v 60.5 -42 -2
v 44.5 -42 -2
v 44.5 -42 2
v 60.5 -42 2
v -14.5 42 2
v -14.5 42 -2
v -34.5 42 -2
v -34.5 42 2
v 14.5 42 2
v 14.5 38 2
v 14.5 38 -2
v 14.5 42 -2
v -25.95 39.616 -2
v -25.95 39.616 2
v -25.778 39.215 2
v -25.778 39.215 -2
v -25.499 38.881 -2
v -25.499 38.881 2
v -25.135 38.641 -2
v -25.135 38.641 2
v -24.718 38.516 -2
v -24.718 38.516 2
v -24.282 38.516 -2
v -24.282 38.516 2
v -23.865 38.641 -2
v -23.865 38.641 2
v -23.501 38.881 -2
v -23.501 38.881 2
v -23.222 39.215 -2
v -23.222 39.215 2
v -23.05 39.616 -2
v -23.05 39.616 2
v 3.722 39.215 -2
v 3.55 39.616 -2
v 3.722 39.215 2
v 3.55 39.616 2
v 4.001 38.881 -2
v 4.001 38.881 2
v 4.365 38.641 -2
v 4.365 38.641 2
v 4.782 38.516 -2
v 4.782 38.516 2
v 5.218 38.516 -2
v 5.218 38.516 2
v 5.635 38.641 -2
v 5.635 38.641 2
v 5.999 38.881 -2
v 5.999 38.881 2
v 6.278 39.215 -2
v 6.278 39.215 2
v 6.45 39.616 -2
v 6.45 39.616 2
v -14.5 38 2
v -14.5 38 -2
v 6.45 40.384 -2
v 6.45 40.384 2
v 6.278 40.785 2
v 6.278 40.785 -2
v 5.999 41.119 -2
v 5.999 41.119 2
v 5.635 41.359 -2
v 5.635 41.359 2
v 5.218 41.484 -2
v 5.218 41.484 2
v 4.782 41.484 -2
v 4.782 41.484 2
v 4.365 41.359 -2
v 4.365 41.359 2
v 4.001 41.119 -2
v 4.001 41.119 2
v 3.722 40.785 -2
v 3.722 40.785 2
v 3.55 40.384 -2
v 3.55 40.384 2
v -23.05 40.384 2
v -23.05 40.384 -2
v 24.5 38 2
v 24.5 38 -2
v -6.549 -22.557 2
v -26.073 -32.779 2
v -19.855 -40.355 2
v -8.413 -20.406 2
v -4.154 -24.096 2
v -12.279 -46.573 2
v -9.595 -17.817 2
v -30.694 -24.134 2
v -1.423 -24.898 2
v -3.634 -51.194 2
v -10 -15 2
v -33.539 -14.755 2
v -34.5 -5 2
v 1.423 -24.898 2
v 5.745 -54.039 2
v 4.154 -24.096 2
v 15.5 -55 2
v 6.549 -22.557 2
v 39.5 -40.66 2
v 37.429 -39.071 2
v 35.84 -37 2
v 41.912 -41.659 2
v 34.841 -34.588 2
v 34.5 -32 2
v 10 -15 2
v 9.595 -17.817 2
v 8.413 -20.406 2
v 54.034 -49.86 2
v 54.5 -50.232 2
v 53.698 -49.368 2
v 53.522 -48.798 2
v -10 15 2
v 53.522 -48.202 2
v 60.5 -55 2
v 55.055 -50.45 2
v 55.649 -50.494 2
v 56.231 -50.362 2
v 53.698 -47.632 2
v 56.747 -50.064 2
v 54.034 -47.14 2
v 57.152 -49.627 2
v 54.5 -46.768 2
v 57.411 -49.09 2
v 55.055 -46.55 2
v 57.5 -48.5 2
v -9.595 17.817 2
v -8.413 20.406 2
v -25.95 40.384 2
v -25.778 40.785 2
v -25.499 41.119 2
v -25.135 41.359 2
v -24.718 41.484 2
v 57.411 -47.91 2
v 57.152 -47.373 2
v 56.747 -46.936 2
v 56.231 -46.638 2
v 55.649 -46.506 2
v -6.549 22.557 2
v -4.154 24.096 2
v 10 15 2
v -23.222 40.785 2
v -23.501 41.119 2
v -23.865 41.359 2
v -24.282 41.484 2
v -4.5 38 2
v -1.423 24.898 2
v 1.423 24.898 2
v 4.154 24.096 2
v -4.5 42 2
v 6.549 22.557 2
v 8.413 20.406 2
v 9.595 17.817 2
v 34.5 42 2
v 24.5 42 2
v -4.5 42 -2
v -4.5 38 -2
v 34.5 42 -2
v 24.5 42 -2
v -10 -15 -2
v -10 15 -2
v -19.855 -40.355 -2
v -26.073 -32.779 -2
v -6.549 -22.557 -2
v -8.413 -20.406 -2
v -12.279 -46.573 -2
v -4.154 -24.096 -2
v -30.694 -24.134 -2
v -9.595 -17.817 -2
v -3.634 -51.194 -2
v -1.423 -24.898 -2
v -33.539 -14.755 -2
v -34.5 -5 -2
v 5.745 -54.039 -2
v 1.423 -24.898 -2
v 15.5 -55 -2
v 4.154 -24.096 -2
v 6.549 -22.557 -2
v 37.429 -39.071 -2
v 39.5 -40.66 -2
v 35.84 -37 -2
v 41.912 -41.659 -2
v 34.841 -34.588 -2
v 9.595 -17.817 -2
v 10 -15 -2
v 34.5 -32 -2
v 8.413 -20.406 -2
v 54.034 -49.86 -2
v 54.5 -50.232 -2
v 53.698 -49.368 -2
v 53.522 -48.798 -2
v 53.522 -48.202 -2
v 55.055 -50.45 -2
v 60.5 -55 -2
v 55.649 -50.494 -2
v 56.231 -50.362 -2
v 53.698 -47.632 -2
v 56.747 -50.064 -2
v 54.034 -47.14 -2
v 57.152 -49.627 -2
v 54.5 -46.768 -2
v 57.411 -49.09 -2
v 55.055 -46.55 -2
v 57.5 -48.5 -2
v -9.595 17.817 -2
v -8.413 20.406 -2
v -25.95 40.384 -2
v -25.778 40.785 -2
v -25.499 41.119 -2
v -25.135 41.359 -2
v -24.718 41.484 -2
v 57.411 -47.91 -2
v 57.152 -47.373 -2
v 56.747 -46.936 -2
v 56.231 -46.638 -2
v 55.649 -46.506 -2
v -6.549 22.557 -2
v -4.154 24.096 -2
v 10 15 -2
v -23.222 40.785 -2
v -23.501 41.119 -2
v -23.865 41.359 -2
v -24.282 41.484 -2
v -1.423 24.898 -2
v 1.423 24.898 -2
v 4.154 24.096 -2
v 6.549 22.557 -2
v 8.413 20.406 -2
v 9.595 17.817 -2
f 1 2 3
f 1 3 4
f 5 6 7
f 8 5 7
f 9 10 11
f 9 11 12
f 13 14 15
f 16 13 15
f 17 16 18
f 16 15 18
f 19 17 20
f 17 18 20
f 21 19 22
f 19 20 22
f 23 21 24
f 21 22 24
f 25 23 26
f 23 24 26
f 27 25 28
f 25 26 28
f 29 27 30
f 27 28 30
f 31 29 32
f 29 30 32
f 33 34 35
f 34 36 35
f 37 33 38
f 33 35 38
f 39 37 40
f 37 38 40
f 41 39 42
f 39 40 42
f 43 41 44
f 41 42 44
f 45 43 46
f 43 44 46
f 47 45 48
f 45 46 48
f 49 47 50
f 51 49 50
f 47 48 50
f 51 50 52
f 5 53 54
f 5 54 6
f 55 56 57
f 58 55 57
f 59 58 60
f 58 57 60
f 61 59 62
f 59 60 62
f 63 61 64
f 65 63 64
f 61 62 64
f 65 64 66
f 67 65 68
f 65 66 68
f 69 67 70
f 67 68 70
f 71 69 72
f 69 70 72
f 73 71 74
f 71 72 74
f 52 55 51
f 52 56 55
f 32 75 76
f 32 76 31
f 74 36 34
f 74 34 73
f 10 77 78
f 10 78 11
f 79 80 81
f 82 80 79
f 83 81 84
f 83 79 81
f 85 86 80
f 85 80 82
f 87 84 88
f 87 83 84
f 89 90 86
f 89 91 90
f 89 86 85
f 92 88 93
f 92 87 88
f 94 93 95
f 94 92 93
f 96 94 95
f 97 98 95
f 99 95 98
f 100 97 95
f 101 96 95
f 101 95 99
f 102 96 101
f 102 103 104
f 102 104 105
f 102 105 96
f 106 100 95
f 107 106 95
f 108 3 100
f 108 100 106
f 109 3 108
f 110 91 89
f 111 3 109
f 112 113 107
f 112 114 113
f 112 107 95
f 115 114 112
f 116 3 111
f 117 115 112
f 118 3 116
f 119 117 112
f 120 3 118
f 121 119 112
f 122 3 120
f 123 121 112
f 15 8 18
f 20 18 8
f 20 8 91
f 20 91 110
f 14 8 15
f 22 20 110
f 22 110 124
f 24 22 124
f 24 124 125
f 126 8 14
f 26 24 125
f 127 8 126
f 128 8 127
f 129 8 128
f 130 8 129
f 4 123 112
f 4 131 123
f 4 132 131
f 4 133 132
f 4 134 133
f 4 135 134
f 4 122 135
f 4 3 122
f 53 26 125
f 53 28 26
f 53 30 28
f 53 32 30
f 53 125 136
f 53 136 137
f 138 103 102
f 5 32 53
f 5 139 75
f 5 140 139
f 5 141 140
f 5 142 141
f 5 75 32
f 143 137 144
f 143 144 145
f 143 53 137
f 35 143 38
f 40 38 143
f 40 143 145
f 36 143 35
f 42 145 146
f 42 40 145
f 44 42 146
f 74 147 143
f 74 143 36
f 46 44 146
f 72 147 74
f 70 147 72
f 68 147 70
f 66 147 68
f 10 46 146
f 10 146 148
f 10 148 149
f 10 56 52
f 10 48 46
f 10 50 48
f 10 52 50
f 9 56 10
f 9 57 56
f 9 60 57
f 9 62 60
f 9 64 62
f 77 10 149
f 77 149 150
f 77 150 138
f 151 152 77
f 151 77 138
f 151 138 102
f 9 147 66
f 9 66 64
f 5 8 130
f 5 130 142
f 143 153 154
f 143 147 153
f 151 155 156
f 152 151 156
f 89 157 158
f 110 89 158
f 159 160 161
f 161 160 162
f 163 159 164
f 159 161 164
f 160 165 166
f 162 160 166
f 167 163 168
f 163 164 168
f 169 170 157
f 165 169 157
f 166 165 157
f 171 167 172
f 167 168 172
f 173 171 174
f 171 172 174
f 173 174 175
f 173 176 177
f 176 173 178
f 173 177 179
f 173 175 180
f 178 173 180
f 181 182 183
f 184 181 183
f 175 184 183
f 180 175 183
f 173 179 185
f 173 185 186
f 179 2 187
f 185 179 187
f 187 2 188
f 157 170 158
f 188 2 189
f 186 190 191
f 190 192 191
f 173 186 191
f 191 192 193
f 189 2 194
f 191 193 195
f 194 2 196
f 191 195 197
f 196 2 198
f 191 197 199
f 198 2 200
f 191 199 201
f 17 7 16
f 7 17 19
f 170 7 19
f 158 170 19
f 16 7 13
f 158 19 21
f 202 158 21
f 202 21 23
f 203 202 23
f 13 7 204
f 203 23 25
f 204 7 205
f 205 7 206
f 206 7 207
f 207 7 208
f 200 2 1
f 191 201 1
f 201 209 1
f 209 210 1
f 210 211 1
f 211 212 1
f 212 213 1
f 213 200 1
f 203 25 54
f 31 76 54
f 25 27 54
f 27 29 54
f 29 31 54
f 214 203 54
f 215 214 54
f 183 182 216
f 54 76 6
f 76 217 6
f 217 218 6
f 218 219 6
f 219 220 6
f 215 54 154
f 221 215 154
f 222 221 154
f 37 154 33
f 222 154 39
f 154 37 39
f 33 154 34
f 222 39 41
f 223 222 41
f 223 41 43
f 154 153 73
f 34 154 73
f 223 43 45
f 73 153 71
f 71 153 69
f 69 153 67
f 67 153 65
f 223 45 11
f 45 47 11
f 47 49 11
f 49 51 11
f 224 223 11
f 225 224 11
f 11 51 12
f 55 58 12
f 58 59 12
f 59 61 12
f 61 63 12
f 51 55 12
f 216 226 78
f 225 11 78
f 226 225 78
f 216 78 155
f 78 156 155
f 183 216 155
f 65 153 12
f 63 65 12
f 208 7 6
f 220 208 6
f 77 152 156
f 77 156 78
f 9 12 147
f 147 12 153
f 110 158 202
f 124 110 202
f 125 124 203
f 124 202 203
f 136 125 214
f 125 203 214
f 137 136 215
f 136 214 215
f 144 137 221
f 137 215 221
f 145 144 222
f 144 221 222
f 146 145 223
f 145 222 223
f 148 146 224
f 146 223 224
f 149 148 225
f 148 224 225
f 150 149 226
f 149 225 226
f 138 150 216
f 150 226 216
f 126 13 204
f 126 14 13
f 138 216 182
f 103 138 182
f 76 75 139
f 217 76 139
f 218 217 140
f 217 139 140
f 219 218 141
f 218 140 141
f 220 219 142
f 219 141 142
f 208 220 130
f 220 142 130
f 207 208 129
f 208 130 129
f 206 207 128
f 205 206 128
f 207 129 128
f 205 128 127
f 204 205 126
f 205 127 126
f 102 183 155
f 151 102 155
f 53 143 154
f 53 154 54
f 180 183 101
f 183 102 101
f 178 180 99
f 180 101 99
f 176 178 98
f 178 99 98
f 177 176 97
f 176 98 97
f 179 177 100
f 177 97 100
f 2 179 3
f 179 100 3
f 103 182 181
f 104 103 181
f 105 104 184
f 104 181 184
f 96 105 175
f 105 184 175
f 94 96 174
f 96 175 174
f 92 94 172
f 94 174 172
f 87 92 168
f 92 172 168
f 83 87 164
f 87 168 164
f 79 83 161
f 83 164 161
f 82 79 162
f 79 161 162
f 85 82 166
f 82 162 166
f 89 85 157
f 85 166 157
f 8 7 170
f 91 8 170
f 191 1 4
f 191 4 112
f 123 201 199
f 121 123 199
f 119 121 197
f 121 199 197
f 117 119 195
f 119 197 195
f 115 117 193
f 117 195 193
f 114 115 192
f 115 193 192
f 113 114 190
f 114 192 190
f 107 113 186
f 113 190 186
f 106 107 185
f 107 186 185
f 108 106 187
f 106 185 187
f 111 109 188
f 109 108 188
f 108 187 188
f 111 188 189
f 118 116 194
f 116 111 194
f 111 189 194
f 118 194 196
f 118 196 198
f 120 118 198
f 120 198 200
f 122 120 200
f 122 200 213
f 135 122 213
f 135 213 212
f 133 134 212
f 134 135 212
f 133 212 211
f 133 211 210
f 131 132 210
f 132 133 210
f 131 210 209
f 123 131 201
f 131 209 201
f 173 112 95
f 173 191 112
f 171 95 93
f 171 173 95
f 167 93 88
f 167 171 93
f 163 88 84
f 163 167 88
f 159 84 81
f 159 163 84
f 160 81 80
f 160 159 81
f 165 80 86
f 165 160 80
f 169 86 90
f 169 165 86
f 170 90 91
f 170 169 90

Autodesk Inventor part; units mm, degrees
sketch "Эскиз2" plane through (0, 0, 0) normal (0, 0, 1) x (1, 0, 0)
  line L0 (-34.5, -42) -> (34.5, -42)
  line L1 (34.5, -42) -> (34.5, 42)
  line L2 (34.5, 42) -> (-34.5, 42)
  line L3 (-34.5, 42) -> (-34.5, -42)
  line L4 (-34.5, -42) -> (34.5, 42) construction
  line L5 (34.5, -42) -> (-34.5, 42) construction
  line L6 (-34.5, -42) -> (50.5, -42)
  line L7 (50.5, -42) -> (50.5, -55)
  line L8 (50.5, -55) -> (-34.5, -55)
  line L9 (-34.5, -55) -> (-34.5, -42)
  circle A0 centre (15.5, -5) radius 50
  line L10 (60.5, -42) -> (60.5, -55) projected
  line L11 (50.5, -42) -> (60.5, -42) projected
  line L12 (50.5, -55) -> (50.5, -42) projected
  line L13 (60.5, -55) -> (50.5, -55) projected
  line L14 (50.5, -55) -> (60.5, -42) construction
  line L15 (50.5, -42) -> (60.5, -55) construction
  circle A1 centre (55.5, -48.5) radius 2
  circle A2 centre (55.5, -48.5) radius 2.8 projected
  point P0 (0, 0)
  point P1 (34.5, -42)
  point P2 (-34.5, -37)
  point P3 (15.5, -55)
  point P4 (-18.1303, -42)
  point P5 (50.5, -42.7071)
  point P6 (-34.5, -5)
  point P7 (-1.5587, 42)
  point P8 (34.5, 41.2493)
  dimension "d15" = 100
  dimension "d27" = 4
  dimension "d35" = 69
extrude "Выдавливание2" add sketch "Эскиз2" along normal mid plane 4 contours A0 L2 L1 L0 | L0 L6 A0 | L3 L2 A0 | A0 L6 L7 L8 | A0 L2 L1 | L7 L11 L10 L13 | A2
sketch "Эскиз3" plane through (0, 0, 2) normal (0, 0, 1) x (1, 0, 0)
  line L0 (34.5, 42) -> (-34.5, 42) projected
  line L1 (-14.5, 42) -> (-4.5, 42)
  line L2 (-4.5, 42) -> (-4.5, 38)
  line L3 (-4.5, 38) -> (-14.5, 38)
  line L4 (-14.5, 38) -> (-14.5, 42)
  line L5 (14.5, 42) -> (24.5, 42)
  line L6 (24.5, 42) -> (24.5, 38)
  line L7 (24.5, 38) -> (14.5, 38)
  line L8 (14.5, 38) -> (14.5, 42)
  line L9 (-34.5, 42) -> (-34.5, -5) projected
  line L10 (34.5, -42) -> (34.5, 42) projected
  point P0 (0, 0)
  point P1 (-34.5, -37)
  point P2 (-14.5, 40)
  point P3 (24.5, 42)
  point P4 (-4.5, 42)
  point P5 (-34.5, -69)
  dimension "d16" = 10
  dimension "d17" = 4
  dimension "d18" = 20
  dimension "d19" = 10
extrude "Выдавливание3" cut sketch "Эскиз3" against normal up to next
fillet "Сопряжение1" radius 10 1 edges at (34.5, -42, 0)
sketch "Эскиз6" plane through (0, 0, 2) normal (0, 0, 1) x (1, 0, 0)
  line L0 (-25.95, 38) -> (-25.95, 42) projected
  line L1 (-23.05, 42) -> (-23.05, 38) projected
  line L2 (3.55, 38) -> (3.55, 42) projected
  line L3 (6.45, 42) -> (6.45, 38) projected
  line L4 (-25.95, 40) -> (-23.05, 40) construction
  line L5 (3.55, 40) -> (6.45, 40) construction
  circle A0 centre (-24.5, 40) radius 1.5
  circle A1 centre (5, 40) radius 1.5
  point P0 (0, 0)
  point P1 (6.45, 40.3841)
  point P2 (3.55, 40.3841)
  point P3 (3.55, 39.6159)
  point P4 (6.45, 39.6159)
  point P5 (-23.05, 40.3841)
  point P6 (-25.95, 40.3841)
  point P7 (-25.95, 39.6159)
  point P8 (-23.05, 39.6159)
  dimension "d28" = 3
extrude "Выдавливание6" cut sketch "Эскиз6" against normal up to next contours L0 A0 L1 | L2 A1 L3
sketch "Эскиз7" plane through (0, 0, -2) normal (0, 0, -1) x (-1, 0, 0)
  line L0 (0, -15) -> (0, 15) construction
  line L1 (10, -15) -> (10, 15)
  line L2 (-10, 15) -> (-10, -15)
  arc A0 (-10, -15) -> (10, -15) centre (0, -15) ccw
  arc A1 (10, 15) -> (-10, 15) centre (0, 15) ccw
  point P0 (0, 0)
  dimension "d31" = 10
  dimension "d32" = 30
extrude "Выдавливание7" cut sketch "Эскиз7" against normal up to next
properties part number "дополнительное_ребро_жёсткости"
